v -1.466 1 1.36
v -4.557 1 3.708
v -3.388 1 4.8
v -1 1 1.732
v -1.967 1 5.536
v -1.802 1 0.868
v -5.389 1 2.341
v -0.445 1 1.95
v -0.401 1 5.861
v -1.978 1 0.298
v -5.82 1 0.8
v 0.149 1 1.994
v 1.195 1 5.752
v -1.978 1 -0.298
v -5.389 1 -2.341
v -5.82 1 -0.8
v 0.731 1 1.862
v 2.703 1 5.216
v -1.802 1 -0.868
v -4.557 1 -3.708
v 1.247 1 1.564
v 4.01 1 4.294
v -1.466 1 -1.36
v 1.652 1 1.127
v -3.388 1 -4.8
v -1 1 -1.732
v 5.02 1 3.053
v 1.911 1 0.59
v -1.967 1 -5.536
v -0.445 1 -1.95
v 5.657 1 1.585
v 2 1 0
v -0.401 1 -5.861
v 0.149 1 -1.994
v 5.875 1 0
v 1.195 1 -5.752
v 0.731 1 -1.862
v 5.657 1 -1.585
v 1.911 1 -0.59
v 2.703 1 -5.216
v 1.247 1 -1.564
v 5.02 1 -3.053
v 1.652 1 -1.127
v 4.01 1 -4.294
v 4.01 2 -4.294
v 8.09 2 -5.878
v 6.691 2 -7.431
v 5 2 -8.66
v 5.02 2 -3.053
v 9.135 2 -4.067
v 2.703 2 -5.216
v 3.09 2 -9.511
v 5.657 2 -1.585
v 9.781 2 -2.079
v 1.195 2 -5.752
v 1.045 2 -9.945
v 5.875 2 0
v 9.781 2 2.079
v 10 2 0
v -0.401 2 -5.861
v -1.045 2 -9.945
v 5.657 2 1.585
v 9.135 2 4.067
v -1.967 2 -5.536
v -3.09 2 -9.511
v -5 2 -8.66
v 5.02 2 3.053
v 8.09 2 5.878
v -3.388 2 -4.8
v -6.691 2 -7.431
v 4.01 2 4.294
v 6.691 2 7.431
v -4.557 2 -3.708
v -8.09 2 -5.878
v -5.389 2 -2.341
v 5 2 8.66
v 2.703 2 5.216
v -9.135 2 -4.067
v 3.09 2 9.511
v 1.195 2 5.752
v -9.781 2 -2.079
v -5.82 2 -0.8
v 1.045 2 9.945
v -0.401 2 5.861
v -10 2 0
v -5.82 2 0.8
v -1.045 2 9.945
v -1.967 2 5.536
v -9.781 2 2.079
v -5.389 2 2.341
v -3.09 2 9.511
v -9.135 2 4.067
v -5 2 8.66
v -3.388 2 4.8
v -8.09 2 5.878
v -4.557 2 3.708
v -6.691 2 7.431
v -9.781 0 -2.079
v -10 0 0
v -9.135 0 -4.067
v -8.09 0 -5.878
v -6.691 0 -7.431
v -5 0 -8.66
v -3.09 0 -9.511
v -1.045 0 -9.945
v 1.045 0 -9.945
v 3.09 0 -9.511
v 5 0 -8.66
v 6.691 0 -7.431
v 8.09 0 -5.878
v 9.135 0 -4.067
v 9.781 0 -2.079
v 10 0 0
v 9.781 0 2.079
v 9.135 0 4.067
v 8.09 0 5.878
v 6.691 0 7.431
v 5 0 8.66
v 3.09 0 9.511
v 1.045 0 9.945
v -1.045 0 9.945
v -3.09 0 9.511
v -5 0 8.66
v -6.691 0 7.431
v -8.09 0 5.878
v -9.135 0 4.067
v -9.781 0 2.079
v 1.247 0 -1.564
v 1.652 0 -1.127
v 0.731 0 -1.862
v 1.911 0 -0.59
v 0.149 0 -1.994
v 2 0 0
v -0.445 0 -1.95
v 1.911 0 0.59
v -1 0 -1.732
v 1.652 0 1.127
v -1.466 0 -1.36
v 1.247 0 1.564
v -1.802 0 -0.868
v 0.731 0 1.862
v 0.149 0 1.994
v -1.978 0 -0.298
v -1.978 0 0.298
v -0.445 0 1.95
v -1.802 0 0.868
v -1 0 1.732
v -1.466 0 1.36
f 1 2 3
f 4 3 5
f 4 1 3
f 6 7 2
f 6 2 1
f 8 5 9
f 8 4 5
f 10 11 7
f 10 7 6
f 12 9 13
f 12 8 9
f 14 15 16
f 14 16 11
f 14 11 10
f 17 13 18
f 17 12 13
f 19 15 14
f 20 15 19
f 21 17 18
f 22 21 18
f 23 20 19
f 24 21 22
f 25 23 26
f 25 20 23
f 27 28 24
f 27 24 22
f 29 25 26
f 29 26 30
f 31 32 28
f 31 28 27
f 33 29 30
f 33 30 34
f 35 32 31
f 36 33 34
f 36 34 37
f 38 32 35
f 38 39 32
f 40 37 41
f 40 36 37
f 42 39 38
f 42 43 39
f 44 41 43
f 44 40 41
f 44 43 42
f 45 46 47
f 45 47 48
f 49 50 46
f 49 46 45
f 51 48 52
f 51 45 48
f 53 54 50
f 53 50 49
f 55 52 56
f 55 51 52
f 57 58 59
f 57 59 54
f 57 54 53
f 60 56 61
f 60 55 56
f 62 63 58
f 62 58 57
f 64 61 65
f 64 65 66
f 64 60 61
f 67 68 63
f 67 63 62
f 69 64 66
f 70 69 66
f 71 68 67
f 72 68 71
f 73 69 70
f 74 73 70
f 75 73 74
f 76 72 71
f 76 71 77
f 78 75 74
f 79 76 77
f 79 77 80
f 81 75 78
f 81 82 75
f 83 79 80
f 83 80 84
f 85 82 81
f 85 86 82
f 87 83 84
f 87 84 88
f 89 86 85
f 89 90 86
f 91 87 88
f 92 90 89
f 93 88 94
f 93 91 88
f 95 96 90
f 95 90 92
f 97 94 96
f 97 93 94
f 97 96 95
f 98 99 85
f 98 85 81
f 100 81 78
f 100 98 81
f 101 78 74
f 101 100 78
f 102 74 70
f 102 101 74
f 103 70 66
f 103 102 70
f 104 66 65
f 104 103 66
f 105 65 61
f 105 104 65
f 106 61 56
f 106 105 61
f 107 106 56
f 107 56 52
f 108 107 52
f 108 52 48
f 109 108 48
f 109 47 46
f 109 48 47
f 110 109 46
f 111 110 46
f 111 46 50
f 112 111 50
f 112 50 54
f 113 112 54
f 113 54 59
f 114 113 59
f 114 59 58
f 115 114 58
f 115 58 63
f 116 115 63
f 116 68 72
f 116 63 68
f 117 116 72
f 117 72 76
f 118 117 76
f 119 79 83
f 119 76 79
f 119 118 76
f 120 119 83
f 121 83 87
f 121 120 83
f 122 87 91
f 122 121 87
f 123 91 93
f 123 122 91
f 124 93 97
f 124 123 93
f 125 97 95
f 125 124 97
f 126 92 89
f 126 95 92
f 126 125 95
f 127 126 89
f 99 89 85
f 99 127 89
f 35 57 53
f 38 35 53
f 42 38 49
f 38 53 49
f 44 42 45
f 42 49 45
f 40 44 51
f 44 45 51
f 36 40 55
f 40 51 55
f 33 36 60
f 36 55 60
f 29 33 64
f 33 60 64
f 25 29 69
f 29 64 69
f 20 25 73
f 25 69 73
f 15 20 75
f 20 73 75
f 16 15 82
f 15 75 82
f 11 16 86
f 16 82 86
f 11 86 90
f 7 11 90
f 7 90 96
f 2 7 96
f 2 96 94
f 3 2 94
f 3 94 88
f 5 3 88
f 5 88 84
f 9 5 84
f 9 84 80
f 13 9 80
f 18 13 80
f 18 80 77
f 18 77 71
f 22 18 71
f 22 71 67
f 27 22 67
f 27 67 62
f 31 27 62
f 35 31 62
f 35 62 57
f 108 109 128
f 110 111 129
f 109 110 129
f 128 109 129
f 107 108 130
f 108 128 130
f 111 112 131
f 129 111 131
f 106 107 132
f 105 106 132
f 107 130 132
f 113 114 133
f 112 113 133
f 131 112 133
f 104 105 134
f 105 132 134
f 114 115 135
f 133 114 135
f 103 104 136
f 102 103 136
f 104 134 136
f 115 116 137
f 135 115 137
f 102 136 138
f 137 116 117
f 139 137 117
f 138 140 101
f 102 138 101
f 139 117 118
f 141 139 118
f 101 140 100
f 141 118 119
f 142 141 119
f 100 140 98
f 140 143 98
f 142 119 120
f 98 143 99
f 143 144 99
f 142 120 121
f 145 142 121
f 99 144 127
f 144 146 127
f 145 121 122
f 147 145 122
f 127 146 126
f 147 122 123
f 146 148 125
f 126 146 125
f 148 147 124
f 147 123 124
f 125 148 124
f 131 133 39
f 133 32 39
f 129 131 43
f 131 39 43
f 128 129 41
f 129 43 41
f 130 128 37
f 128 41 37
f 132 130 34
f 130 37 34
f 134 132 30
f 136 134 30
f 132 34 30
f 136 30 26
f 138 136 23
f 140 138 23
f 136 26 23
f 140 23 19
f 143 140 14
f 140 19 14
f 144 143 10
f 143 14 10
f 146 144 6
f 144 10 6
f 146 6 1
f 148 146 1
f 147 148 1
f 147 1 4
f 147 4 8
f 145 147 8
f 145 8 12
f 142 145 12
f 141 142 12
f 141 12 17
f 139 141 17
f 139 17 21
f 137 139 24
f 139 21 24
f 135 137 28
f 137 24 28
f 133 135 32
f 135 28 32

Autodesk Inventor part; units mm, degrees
ref_plane "YZ Plane" through (0, 0, 0) normal (1, 0, 0) x (0, 1, 0)
ref_plane "XZ Plane" through (0, 0, 0) normal (0, 1, 0) x (-1, 0, 0)
ref_plane "XY Plane" through (0, 0, 0) normal (0, 0, 1) x (1, 0, 0)
sketch "Sketch1" plane through (0, 0, 0) normal (0, 1, 0) x (-1, 0, 0)
  circle A0 centre (0, 0) radius 10
  dimension "d0" = 20
extrude "Extrusion1" add sketch "Sketch1" along normal blind 2
sketch "Sketch2" plane through (0, 2, 0) normal (0, 1, 0) x (1, 0, 0)
  circle A0 centre (0, 0) radius 5.875
  dimension "d3" = 11.75
extrude "Extrusion2" cut sketch "Sketch2" against normal blind 1
sketch "Sketch3" plane through (0, 1, 0) normal (0, 1, 0) x (1, 0, 0)
  circle A0 centre (0, 0) radius 2
  dimension "d6" = 4
extrude "Extrusion3" cut sketch "Sketch3" against normal through all
properties part number "M3Bearing_Holder"
